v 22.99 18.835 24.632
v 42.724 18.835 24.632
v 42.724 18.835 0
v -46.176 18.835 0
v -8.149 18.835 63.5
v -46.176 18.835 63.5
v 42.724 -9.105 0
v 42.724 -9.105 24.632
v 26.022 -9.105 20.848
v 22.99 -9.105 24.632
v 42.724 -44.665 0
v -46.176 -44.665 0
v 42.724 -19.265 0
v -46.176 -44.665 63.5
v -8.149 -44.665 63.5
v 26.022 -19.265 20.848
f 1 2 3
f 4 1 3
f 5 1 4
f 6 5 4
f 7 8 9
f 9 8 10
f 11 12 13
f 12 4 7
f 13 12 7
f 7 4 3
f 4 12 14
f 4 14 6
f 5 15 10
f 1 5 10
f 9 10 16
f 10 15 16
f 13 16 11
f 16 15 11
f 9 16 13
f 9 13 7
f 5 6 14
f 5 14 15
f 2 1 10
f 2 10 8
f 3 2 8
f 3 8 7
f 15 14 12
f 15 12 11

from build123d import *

# Parameters (mm, degrees)
F0_W     = 88.9
F0_H     = 63.5
F1_DEPTH = 63.5
F3_DEPTH = 63.501
F4_W     = 38.1
F4_H     = 26.7130212291
F5_DEPTH = 25.4
F6_W     = 25.4
F6_H     = 38.1
F7_DEPTH = 40.132
F9_DEPTH = 27.94


with BuildPart() as f1:
    # F0 (on Top) → F1 (new body)
    with BuildSketch(Plane.XY):
        with Locations((-1.7257053405, -12.9154672953)):
            Rectangle(F0_W, F0_H)
    extrude(amount=F1_DEPTH)

    # F2 (on face) → F3 (cut, through all)
    with BuildSketch(Plane.XZ.offset(44.6654672953)):
        Polygon((42.7242946595, 63.5), (-8.1487037241, 63.5), (42.7242946595, 0), align=None)
    extrude(amount=-F3_DEPTH, mode=Mode.SUBTRACT)

    # F4 (on face) → F5 (join)
    with BuildSketch(Plane(origin=(26.0221932234, 0, 20.8476691936), x_dir=(0, 1, 0), z_dir=(0.7804309746, 0, 0.6252419482))):
        with Locations((-0.2154672953, -13.3565106146)):
            Rectangle(F4_W, F4_H)
    extrude(amount=F5_DEPTH)

    # F6 (on face) → F7 (cut)
    with BuildSketch(Plane(origin=(0, 0, 0), x_dir=(0.7804309746, 0, 0.6252419482), z_dir=(-0.6252419482, 0, 0.7804309746))):
        with Locations((46.0433629222, -0.2154672953)):
            Rectangle(F6_W, F6_H)
    extrude(amount=-F7_DEPTH, mode=Mode.SUBTRACT)

    # F8 (on face) → F9 (join)
    with BuildSketch(Plane(origin=(0, 18.8345327047, 0), x_dir=(-1, 0, 0), z_dir=(0, 1, 0))):
        Polygon((-42.7242946595, 0), (-22.9904382266, 24.6319250545), (-42.7242946595, 24.6319250545), align=None)
    extrude(amount=-F9_DEPTH)


solid = f1.part
